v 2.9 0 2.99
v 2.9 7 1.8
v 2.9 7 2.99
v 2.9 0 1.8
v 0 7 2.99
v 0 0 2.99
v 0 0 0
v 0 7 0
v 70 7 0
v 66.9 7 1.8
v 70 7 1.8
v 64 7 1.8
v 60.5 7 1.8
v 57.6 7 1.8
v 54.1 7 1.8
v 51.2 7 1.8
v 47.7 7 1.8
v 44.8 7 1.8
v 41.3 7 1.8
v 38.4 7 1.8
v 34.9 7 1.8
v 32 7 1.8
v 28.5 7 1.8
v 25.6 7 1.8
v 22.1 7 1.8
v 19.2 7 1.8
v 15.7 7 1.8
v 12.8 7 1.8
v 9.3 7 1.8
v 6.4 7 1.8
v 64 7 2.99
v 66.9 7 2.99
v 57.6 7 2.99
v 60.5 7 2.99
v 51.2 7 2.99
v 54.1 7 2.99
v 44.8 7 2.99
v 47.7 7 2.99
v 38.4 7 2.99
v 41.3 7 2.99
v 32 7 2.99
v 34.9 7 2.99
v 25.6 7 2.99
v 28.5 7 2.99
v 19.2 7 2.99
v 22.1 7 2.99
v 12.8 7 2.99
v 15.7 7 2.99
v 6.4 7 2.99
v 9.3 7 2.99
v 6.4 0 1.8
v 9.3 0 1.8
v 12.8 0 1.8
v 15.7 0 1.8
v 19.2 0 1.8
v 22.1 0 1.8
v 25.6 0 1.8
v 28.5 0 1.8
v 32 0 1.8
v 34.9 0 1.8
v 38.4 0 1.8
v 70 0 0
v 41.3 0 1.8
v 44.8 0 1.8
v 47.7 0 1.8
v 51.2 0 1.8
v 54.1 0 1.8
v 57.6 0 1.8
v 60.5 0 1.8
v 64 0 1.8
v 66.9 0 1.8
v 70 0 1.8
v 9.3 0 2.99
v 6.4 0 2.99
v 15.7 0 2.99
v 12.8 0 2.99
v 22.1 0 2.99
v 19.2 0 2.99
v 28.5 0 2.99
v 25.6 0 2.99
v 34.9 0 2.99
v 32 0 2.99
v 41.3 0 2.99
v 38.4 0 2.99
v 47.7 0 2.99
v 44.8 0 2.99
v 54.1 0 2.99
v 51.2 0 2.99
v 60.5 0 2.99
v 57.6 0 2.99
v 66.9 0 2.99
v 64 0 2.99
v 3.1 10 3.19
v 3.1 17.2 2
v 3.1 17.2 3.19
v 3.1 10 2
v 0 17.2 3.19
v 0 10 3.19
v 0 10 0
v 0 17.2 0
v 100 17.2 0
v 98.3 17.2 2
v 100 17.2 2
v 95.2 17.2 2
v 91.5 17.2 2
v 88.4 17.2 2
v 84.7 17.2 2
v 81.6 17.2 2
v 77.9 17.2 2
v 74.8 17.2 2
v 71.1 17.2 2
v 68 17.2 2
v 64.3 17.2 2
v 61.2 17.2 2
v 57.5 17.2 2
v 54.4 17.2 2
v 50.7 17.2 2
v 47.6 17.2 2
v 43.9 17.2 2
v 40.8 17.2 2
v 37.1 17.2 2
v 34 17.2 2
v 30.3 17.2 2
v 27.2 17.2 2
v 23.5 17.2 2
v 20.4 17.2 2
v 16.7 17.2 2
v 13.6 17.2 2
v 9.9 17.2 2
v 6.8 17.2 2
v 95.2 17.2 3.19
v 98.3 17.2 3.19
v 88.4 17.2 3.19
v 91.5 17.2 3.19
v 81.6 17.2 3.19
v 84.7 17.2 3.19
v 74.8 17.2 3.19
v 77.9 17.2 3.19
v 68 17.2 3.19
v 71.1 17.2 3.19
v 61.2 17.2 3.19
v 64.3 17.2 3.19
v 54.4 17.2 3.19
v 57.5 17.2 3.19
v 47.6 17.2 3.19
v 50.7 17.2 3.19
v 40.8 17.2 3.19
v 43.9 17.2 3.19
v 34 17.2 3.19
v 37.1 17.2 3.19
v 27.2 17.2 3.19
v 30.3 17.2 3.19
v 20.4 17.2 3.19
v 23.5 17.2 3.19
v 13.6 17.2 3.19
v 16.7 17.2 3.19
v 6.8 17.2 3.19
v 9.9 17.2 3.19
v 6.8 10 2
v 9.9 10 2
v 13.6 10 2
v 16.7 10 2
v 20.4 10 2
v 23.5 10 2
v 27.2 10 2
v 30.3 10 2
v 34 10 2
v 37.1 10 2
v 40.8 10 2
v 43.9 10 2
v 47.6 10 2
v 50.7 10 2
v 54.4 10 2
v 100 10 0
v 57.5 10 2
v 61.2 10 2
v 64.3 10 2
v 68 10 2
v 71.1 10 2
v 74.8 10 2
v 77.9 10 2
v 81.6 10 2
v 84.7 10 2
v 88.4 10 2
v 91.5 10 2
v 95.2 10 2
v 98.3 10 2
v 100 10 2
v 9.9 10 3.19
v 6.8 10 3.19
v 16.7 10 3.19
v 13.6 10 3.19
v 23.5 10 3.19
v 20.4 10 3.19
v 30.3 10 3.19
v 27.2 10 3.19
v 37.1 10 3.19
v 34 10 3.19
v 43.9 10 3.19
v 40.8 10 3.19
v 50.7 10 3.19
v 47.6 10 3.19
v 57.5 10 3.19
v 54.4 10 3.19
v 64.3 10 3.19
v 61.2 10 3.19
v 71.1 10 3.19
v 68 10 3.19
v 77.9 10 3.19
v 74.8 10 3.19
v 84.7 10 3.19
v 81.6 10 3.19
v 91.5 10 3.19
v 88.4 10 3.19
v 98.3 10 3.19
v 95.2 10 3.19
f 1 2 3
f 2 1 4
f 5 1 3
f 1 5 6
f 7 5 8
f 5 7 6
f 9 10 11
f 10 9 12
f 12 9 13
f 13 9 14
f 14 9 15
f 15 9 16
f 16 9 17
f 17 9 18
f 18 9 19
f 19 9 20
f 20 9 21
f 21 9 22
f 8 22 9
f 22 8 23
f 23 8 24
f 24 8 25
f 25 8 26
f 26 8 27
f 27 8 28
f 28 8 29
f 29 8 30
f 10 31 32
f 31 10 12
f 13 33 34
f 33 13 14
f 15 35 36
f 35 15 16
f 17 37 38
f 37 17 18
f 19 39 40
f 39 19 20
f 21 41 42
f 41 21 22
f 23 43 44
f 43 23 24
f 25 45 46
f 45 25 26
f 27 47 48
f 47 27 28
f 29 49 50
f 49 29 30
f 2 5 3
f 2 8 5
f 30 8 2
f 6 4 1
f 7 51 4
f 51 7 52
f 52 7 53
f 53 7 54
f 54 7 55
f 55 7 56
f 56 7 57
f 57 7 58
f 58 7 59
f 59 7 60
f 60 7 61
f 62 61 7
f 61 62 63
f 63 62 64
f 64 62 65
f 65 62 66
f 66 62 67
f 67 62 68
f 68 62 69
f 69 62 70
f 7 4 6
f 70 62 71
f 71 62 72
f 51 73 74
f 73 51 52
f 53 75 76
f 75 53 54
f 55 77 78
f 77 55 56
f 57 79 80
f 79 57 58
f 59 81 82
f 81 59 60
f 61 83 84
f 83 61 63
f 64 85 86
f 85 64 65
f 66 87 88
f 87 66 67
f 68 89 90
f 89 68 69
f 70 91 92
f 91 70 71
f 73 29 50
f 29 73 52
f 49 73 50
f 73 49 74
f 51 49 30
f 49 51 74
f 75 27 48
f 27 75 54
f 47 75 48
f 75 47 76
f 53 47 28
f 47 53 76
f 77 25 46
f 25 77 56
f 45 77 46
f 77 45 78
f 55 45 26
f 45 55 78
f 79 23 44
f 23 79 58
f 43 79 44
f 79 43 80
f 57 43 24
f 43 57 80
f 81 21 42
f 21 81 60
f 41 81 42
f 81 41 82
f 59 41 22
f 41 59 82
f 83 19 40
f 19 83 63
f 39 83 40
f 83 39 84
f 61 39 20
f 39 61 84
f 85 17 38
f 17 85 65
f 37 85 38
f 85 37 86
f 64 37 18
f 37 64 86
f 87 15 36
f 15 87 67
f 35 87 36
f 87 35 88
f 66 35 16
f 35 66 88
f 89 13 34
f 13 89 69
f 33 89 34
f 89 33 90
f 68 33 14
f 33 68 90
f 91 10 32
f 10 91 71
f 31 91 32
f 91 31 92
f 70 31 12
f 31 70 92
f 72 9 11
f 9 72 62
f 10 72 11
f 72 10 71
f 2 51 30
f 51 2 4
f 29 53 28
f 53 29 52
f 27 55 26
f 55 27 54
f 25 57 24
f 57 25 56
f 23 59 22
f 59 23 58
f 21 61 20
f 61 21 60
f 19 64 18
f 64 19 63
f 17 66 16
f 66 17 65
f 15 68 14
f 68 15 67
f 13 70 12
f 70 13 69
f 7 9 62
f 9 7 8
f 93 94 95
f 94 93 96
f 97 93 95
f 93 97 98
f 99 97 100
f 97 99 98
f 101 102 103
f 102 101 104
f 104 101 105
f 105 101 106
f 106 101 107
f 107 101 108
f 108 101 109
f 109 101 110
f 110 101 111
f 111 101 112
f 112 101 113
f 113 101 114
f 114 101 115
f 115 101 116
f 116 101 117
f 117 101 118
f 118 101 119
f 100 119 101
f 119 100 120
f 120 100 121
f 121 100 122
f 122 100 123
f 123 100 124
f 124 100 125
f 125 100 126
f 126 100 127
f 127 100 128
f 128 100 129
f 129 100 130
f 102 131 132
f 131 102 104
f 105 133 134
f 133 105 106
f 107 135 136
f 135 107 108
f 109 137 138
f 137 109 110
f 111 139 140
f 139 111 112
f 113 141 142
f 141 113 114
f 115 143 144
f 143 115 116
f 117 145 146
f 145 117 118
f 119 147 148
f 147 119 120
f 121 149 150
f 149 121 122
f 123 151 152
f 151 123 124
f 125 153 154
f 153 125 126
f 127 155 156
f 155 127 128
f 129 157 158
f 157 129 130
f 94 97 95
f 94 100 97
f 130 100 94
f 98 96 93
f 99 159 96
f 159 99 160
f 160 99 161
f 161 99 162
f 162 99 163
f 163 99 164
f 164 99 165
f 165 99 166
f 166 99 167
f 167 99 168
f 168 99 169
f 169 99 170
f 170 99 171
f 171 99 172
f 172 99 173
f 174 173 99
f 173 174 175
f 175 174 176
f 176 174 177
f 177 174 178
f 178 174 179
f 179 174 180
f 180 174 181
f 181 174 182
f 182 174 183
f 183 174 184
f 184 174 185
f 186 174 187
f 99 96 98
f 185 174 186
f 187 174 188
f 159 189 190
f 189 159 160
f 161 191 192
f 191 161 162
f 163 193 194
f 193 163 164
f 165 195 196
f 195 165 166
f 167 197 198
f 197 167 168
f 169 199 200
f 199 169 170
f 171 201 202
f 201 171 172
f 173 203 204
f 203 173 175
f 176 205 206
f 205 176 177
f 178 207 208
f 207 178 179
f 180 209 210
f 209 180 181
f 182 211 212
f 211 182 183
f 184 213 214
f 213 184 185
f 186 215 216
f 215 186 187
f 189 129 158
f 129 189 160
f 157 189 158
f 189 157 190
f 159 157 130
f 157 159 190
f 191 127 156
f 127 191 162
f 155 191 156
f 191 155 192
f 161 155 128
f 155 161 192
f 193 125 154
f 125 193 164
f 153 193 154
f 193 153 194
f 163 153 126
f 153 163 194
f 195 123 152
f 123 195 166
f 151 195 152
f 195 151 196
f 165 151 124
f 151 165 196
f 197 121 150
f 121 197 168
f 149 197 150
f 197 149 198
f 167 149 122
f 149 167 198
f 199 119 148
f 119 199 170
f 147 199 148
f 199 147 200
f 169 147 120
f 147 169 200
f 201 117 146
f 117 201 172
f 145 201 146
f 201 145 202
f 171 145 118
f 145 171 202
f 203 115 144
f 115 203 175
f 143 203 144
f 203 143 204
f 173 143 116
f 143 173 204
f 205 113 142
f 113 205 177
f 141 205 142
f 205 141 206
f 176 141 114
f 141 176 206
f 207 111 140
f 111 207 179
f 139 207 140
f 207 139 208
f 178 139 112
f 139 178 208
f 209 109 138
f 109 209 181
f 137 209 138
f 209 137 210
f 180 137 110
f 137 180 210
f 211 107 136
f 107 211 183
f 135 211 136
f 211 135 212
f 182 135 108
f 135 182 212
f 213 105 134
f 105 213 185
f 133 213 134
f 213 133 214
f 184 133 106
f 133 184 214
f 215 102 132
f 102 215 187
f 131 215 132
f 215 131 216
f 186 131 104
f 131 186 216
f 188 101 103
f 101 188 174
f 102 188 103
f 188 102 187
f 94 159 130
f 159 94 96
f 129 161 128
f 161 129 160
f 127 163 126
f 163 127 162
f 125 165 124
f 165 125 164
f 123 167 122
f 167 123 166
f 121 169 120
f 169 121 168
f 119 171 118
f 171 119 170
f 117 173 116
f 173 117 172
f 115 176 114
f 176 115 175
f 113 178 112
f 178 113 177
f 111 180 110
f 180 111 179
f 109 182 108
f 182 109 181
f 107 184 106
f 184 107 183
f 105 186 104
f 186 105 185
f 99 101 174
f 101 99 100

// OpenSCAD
function 2XLBeltBaseHeight(3dPrinterTolerance=.4)= 1.4 + 3dPrinterTolerance;
function 2XLBeltGripHeight(3dPrinterTolerance=.4)= 2.6 + 3dPrinterTolerance;
function 2XLBeltToothWidth(3dPrinterTolerance=.4)= 2.5 + 3dPrinterTolerance;
function 2XLBeltSpaceWidth(3dPrinterTolerance=.4)= 3.1 + 3dPrinterTolerance;
function 2XLBeltWidth(3dPrinterTolerance=.4)= 6.6 + 3dPrinterTolerance;



function 2XLBeltAvgHeight(3dPrinterTolerance=.4)=(2XLBeltBaseHeight()+2XLBeltGripHeight()*2)/3;


module belt(Length=70, 3dPrinterTolerance=.4) {
	cube([Length,2XLBeltWidth(3dPrinterTolerance),2XLBeltBaseHeight(3dPrinterTolerance)]) ;
	for (inc = [0:(2XLBeltToothWidth(3dPrinterTolerance)
+2XLBeltSpaceWidth(3dPrinterTolerance)):Length-2XLBeltToothWidth(3dPrinterTolerance)
]) translate([inc,0,2XLBeltBaseHeight(3dPrinterTolerance)-0.01]) cube([2XLBeltToothWidth(3dPrinterTolerance)
,2XLBeltWidth(3dPrinterTolerance),(2XLBeltGripHeight(3dPrinterTolerance)-2XLBeltBaseHeight(3dPrinterTolerance))]) ;
}

belt();

translate([0,10,0])
belt(100, .6);
